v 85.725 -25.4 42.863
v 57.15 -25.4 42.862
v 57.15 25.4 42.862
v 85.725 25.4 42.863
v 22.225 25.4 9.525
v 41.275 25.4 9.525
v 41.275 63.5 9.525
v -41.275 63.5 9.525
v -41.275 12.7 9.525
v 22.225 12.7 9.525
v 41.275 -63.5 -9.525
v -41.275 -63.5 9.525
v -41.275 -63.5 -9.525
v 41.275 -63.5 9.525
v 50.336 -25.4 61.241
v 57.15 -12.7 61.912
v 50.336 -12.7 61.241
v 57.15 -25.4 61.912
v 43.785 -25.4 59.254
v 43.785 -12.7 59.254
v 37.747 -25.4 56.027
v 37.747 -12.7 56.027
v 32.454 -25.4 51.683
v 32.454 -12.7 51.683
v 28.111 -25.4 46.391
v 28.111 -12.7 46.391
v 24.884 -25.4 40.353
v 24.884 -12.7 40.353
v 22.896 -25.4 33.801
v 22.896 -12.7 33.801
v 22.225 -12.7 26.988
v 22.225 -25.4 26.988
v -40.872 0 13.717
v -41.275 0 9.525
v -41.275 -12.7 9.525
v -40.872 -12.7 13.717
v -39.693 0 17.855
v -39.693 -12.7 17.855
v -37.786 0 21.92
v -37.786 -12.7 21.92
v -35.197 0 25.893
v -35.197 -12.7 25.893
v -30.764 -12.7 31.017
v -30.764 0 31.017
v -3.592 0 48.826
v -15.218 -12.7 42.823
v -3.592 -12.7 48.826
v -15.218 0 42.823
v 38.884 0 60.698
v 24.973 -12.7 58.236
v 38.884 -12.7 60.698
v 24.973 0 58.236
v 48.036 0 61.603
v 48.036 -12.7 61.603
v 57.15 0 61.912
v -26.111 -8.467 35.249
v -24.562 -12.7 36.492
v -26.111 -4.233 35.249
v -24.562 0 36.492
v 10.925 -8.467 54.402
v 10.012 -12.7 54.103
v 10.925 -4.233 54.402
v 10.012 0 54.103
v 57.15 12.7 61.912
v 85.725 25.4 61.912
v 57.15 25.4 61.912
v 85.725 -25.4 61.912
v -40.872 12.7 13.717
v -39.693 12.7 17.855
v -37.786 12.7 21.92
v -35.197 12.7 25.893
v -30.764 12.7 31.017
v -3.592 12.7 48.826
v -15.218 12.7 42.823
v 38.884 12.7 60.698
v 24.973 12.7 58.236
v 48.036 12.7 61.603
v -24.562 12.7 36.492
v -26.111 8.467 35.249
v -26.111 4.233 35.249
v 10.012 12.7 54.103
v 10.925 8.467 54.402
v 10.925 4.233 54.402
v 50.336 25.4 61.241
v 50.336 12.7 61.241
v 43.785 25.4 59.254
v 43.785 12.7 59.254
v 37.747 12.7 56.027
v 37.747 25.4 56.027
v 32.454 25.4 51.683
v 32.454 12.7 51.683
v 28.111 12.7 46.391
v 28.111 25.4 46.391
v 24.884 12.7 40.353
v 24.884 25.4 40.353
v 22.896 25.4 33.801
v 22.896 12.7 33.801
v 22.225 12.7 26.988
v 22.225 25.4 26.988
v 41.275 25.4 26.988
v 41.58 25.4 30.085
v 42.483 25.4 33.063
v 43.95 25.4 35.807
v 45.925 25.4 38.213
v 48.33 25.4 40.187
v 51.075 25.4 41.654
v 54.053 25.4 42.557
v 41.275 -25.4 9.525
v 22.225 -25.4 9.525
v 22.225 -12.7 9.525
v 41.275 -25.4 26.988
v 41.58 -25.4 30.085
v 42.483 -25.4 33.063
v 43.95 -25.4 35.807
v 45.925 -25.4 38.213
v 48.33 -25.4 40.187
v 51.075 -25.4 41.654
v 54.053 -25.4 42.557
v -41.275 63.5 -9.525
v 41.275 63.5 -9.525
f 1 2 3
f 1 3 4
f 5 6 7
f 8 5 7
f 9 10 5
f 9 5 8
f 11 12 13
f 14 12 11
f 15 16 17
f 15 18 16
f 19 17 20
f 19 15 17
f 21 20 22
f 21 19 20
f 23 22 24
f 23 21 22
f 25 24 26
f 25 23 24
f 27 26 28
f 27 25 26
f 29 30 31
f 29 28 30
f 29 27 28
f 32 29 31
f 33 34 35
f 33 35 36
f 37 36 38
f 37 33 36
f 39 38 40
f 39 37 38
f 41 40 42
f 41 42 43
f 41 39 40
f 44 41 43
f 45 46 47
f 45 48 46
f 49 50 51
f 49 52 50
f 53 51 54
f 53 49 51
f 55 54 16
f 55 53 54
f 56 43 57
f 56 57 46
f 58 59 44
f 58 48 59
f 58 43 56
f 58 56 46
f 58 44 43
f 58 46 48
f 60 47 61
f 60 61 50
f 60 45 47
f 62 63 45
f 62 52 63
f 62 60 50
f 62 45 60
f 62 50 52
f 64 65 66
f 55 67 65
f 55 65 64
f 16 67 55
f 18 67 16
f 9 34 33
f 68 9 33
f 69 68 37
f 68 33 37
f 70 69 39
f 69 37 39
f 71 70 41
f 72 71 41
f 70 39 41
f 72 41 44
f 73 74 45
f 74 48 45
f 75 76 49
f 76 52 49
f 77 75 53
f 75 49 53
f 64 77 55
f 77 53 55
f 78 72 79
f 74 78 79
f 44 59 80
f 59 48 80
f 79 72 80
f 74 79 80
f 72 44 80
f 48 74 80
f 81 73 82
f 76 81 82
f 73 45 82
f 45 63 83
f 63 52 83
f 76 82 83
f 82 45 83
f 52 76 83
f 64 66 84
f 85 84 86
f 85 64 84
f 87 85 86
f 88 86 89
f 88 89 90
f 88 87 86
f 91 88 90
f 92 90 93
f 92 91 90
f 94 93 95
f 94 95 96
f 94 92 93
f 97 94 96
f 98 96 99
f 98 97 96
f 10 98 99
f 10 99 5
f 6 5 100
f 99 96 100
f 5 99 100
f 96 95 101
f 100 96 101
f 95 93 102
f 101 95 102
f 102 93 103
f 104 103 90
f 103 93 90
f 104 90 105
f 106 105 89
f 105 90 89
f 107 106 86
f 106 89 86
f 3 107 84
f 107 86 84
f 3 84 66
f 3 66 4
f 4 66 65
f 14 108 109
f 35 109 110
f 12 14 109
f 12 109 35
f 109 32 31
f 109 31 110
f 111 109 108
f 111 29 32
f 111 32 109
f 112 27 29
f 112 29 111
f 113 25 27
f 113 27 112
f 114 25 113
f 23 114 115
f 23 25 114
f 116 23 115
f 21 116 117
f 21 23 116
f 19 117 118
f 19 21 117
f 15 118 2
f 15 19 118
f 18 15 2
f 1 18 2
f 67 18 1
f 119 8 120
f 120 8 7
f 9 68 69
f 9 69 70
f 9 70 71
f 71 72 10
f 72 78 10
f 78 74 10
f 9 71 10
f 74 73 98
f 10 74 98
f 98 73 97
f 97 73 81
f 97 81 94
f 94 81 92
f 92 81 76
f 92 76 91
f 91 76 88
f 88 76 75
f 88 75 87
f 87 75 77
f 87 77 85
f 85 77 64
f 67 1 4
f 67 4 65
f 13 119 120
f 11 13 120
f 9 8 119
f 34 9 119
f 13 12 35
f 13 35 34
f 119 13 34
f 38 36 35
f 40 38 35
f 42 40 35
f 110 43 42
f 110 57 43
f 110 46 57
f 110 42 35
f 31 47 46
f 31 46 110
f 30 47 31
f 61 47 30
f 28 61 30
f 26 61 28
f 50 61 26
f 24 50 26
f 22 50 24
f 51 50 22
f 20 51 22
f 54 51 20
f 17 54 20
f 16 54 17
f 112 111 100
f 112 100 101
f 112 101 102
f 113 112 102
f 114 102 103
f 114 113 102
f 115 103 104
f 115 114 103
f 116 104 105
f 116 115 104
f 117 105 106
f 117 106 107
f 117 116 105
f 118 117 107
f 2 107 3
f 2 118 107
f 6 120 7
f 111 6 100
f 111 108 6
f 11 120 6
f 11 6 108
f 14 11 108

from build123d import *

# Parameters (mm, degrees)
F1_DEPTH = 63.5
F0_W     = 25.4
F0_H     = 19.05
F2_DEPTH = 25.4
F3_DEPTH = 12.7


with BuildPart() as f1:
    # F0 (on Front) → F1 (new body, symmetric)
    with BuildSketch(Plane.XZ):
        Polygon((41.275, -9.525), (41.275, 9.525), (22.225, 9.525), (-41.275, 9.525), (-41.275, -9.525), align=None)
    extrude(amount=F1_DEPTH, both=True)

    # F0 (on Front) → F2 (join, symmetric)
    with BuildSketch(Plane.XZ):
        with BuildLine():
            Line((22.225, 9.525), (41.275, 9.525))
            Line((41.275, 9.525), (41.275, 26.9875))
            ThreePointArc((41.275, 26.9875), (45.9246798487, 38.2128201513), (57.15, 42.8625))
            Line((57.15, 42.8625), (60.325, 42.8625))
            Line((60.325, 42.8625), (60.325, 61.9125))
            Line((60.325, 61.9125), (57.15, 61.9125))
            ThreePointArc((57.15, 61.9125), (32.4542956671, 51.6832043329), (22.225, 26.9875))
            Line((22.225, 26.9875), (22.225, 9.525))
        make_face()
        with Locations((73.025, 52.3875)):
            Rectangle(F0_W, F0_H)
    extrude(amount=F2_DEPTH, both=True)

    # F0 (on Front) → F3 (join, symmetric)
    with BuildSketch(Plane.XZ):
        with BuildLine():
            Line((-41.275, 9.525), (22.225, 9.525))
            Line((22.225, 9.525), (22.225, 26.9875))
            ThreePointArc((22.225, 26.9875), (32.4542956671, 51.6832043329), (57.15, 61.9125))
            add(Edge.make_bspline(
                [(-41.275, 9.525), (-41.275, 36.84458516), (10.5578337313, 61.9125), (57.15, 61.9125)],
                knots=[0, 0, 0, 0, 111.4985685166, 111.4985685166, 111.4985685166, 111.4985685166], degree=3))
        make_face()
    extrude(amount=F3_DEPTH, both=True)


solid = f1.part
